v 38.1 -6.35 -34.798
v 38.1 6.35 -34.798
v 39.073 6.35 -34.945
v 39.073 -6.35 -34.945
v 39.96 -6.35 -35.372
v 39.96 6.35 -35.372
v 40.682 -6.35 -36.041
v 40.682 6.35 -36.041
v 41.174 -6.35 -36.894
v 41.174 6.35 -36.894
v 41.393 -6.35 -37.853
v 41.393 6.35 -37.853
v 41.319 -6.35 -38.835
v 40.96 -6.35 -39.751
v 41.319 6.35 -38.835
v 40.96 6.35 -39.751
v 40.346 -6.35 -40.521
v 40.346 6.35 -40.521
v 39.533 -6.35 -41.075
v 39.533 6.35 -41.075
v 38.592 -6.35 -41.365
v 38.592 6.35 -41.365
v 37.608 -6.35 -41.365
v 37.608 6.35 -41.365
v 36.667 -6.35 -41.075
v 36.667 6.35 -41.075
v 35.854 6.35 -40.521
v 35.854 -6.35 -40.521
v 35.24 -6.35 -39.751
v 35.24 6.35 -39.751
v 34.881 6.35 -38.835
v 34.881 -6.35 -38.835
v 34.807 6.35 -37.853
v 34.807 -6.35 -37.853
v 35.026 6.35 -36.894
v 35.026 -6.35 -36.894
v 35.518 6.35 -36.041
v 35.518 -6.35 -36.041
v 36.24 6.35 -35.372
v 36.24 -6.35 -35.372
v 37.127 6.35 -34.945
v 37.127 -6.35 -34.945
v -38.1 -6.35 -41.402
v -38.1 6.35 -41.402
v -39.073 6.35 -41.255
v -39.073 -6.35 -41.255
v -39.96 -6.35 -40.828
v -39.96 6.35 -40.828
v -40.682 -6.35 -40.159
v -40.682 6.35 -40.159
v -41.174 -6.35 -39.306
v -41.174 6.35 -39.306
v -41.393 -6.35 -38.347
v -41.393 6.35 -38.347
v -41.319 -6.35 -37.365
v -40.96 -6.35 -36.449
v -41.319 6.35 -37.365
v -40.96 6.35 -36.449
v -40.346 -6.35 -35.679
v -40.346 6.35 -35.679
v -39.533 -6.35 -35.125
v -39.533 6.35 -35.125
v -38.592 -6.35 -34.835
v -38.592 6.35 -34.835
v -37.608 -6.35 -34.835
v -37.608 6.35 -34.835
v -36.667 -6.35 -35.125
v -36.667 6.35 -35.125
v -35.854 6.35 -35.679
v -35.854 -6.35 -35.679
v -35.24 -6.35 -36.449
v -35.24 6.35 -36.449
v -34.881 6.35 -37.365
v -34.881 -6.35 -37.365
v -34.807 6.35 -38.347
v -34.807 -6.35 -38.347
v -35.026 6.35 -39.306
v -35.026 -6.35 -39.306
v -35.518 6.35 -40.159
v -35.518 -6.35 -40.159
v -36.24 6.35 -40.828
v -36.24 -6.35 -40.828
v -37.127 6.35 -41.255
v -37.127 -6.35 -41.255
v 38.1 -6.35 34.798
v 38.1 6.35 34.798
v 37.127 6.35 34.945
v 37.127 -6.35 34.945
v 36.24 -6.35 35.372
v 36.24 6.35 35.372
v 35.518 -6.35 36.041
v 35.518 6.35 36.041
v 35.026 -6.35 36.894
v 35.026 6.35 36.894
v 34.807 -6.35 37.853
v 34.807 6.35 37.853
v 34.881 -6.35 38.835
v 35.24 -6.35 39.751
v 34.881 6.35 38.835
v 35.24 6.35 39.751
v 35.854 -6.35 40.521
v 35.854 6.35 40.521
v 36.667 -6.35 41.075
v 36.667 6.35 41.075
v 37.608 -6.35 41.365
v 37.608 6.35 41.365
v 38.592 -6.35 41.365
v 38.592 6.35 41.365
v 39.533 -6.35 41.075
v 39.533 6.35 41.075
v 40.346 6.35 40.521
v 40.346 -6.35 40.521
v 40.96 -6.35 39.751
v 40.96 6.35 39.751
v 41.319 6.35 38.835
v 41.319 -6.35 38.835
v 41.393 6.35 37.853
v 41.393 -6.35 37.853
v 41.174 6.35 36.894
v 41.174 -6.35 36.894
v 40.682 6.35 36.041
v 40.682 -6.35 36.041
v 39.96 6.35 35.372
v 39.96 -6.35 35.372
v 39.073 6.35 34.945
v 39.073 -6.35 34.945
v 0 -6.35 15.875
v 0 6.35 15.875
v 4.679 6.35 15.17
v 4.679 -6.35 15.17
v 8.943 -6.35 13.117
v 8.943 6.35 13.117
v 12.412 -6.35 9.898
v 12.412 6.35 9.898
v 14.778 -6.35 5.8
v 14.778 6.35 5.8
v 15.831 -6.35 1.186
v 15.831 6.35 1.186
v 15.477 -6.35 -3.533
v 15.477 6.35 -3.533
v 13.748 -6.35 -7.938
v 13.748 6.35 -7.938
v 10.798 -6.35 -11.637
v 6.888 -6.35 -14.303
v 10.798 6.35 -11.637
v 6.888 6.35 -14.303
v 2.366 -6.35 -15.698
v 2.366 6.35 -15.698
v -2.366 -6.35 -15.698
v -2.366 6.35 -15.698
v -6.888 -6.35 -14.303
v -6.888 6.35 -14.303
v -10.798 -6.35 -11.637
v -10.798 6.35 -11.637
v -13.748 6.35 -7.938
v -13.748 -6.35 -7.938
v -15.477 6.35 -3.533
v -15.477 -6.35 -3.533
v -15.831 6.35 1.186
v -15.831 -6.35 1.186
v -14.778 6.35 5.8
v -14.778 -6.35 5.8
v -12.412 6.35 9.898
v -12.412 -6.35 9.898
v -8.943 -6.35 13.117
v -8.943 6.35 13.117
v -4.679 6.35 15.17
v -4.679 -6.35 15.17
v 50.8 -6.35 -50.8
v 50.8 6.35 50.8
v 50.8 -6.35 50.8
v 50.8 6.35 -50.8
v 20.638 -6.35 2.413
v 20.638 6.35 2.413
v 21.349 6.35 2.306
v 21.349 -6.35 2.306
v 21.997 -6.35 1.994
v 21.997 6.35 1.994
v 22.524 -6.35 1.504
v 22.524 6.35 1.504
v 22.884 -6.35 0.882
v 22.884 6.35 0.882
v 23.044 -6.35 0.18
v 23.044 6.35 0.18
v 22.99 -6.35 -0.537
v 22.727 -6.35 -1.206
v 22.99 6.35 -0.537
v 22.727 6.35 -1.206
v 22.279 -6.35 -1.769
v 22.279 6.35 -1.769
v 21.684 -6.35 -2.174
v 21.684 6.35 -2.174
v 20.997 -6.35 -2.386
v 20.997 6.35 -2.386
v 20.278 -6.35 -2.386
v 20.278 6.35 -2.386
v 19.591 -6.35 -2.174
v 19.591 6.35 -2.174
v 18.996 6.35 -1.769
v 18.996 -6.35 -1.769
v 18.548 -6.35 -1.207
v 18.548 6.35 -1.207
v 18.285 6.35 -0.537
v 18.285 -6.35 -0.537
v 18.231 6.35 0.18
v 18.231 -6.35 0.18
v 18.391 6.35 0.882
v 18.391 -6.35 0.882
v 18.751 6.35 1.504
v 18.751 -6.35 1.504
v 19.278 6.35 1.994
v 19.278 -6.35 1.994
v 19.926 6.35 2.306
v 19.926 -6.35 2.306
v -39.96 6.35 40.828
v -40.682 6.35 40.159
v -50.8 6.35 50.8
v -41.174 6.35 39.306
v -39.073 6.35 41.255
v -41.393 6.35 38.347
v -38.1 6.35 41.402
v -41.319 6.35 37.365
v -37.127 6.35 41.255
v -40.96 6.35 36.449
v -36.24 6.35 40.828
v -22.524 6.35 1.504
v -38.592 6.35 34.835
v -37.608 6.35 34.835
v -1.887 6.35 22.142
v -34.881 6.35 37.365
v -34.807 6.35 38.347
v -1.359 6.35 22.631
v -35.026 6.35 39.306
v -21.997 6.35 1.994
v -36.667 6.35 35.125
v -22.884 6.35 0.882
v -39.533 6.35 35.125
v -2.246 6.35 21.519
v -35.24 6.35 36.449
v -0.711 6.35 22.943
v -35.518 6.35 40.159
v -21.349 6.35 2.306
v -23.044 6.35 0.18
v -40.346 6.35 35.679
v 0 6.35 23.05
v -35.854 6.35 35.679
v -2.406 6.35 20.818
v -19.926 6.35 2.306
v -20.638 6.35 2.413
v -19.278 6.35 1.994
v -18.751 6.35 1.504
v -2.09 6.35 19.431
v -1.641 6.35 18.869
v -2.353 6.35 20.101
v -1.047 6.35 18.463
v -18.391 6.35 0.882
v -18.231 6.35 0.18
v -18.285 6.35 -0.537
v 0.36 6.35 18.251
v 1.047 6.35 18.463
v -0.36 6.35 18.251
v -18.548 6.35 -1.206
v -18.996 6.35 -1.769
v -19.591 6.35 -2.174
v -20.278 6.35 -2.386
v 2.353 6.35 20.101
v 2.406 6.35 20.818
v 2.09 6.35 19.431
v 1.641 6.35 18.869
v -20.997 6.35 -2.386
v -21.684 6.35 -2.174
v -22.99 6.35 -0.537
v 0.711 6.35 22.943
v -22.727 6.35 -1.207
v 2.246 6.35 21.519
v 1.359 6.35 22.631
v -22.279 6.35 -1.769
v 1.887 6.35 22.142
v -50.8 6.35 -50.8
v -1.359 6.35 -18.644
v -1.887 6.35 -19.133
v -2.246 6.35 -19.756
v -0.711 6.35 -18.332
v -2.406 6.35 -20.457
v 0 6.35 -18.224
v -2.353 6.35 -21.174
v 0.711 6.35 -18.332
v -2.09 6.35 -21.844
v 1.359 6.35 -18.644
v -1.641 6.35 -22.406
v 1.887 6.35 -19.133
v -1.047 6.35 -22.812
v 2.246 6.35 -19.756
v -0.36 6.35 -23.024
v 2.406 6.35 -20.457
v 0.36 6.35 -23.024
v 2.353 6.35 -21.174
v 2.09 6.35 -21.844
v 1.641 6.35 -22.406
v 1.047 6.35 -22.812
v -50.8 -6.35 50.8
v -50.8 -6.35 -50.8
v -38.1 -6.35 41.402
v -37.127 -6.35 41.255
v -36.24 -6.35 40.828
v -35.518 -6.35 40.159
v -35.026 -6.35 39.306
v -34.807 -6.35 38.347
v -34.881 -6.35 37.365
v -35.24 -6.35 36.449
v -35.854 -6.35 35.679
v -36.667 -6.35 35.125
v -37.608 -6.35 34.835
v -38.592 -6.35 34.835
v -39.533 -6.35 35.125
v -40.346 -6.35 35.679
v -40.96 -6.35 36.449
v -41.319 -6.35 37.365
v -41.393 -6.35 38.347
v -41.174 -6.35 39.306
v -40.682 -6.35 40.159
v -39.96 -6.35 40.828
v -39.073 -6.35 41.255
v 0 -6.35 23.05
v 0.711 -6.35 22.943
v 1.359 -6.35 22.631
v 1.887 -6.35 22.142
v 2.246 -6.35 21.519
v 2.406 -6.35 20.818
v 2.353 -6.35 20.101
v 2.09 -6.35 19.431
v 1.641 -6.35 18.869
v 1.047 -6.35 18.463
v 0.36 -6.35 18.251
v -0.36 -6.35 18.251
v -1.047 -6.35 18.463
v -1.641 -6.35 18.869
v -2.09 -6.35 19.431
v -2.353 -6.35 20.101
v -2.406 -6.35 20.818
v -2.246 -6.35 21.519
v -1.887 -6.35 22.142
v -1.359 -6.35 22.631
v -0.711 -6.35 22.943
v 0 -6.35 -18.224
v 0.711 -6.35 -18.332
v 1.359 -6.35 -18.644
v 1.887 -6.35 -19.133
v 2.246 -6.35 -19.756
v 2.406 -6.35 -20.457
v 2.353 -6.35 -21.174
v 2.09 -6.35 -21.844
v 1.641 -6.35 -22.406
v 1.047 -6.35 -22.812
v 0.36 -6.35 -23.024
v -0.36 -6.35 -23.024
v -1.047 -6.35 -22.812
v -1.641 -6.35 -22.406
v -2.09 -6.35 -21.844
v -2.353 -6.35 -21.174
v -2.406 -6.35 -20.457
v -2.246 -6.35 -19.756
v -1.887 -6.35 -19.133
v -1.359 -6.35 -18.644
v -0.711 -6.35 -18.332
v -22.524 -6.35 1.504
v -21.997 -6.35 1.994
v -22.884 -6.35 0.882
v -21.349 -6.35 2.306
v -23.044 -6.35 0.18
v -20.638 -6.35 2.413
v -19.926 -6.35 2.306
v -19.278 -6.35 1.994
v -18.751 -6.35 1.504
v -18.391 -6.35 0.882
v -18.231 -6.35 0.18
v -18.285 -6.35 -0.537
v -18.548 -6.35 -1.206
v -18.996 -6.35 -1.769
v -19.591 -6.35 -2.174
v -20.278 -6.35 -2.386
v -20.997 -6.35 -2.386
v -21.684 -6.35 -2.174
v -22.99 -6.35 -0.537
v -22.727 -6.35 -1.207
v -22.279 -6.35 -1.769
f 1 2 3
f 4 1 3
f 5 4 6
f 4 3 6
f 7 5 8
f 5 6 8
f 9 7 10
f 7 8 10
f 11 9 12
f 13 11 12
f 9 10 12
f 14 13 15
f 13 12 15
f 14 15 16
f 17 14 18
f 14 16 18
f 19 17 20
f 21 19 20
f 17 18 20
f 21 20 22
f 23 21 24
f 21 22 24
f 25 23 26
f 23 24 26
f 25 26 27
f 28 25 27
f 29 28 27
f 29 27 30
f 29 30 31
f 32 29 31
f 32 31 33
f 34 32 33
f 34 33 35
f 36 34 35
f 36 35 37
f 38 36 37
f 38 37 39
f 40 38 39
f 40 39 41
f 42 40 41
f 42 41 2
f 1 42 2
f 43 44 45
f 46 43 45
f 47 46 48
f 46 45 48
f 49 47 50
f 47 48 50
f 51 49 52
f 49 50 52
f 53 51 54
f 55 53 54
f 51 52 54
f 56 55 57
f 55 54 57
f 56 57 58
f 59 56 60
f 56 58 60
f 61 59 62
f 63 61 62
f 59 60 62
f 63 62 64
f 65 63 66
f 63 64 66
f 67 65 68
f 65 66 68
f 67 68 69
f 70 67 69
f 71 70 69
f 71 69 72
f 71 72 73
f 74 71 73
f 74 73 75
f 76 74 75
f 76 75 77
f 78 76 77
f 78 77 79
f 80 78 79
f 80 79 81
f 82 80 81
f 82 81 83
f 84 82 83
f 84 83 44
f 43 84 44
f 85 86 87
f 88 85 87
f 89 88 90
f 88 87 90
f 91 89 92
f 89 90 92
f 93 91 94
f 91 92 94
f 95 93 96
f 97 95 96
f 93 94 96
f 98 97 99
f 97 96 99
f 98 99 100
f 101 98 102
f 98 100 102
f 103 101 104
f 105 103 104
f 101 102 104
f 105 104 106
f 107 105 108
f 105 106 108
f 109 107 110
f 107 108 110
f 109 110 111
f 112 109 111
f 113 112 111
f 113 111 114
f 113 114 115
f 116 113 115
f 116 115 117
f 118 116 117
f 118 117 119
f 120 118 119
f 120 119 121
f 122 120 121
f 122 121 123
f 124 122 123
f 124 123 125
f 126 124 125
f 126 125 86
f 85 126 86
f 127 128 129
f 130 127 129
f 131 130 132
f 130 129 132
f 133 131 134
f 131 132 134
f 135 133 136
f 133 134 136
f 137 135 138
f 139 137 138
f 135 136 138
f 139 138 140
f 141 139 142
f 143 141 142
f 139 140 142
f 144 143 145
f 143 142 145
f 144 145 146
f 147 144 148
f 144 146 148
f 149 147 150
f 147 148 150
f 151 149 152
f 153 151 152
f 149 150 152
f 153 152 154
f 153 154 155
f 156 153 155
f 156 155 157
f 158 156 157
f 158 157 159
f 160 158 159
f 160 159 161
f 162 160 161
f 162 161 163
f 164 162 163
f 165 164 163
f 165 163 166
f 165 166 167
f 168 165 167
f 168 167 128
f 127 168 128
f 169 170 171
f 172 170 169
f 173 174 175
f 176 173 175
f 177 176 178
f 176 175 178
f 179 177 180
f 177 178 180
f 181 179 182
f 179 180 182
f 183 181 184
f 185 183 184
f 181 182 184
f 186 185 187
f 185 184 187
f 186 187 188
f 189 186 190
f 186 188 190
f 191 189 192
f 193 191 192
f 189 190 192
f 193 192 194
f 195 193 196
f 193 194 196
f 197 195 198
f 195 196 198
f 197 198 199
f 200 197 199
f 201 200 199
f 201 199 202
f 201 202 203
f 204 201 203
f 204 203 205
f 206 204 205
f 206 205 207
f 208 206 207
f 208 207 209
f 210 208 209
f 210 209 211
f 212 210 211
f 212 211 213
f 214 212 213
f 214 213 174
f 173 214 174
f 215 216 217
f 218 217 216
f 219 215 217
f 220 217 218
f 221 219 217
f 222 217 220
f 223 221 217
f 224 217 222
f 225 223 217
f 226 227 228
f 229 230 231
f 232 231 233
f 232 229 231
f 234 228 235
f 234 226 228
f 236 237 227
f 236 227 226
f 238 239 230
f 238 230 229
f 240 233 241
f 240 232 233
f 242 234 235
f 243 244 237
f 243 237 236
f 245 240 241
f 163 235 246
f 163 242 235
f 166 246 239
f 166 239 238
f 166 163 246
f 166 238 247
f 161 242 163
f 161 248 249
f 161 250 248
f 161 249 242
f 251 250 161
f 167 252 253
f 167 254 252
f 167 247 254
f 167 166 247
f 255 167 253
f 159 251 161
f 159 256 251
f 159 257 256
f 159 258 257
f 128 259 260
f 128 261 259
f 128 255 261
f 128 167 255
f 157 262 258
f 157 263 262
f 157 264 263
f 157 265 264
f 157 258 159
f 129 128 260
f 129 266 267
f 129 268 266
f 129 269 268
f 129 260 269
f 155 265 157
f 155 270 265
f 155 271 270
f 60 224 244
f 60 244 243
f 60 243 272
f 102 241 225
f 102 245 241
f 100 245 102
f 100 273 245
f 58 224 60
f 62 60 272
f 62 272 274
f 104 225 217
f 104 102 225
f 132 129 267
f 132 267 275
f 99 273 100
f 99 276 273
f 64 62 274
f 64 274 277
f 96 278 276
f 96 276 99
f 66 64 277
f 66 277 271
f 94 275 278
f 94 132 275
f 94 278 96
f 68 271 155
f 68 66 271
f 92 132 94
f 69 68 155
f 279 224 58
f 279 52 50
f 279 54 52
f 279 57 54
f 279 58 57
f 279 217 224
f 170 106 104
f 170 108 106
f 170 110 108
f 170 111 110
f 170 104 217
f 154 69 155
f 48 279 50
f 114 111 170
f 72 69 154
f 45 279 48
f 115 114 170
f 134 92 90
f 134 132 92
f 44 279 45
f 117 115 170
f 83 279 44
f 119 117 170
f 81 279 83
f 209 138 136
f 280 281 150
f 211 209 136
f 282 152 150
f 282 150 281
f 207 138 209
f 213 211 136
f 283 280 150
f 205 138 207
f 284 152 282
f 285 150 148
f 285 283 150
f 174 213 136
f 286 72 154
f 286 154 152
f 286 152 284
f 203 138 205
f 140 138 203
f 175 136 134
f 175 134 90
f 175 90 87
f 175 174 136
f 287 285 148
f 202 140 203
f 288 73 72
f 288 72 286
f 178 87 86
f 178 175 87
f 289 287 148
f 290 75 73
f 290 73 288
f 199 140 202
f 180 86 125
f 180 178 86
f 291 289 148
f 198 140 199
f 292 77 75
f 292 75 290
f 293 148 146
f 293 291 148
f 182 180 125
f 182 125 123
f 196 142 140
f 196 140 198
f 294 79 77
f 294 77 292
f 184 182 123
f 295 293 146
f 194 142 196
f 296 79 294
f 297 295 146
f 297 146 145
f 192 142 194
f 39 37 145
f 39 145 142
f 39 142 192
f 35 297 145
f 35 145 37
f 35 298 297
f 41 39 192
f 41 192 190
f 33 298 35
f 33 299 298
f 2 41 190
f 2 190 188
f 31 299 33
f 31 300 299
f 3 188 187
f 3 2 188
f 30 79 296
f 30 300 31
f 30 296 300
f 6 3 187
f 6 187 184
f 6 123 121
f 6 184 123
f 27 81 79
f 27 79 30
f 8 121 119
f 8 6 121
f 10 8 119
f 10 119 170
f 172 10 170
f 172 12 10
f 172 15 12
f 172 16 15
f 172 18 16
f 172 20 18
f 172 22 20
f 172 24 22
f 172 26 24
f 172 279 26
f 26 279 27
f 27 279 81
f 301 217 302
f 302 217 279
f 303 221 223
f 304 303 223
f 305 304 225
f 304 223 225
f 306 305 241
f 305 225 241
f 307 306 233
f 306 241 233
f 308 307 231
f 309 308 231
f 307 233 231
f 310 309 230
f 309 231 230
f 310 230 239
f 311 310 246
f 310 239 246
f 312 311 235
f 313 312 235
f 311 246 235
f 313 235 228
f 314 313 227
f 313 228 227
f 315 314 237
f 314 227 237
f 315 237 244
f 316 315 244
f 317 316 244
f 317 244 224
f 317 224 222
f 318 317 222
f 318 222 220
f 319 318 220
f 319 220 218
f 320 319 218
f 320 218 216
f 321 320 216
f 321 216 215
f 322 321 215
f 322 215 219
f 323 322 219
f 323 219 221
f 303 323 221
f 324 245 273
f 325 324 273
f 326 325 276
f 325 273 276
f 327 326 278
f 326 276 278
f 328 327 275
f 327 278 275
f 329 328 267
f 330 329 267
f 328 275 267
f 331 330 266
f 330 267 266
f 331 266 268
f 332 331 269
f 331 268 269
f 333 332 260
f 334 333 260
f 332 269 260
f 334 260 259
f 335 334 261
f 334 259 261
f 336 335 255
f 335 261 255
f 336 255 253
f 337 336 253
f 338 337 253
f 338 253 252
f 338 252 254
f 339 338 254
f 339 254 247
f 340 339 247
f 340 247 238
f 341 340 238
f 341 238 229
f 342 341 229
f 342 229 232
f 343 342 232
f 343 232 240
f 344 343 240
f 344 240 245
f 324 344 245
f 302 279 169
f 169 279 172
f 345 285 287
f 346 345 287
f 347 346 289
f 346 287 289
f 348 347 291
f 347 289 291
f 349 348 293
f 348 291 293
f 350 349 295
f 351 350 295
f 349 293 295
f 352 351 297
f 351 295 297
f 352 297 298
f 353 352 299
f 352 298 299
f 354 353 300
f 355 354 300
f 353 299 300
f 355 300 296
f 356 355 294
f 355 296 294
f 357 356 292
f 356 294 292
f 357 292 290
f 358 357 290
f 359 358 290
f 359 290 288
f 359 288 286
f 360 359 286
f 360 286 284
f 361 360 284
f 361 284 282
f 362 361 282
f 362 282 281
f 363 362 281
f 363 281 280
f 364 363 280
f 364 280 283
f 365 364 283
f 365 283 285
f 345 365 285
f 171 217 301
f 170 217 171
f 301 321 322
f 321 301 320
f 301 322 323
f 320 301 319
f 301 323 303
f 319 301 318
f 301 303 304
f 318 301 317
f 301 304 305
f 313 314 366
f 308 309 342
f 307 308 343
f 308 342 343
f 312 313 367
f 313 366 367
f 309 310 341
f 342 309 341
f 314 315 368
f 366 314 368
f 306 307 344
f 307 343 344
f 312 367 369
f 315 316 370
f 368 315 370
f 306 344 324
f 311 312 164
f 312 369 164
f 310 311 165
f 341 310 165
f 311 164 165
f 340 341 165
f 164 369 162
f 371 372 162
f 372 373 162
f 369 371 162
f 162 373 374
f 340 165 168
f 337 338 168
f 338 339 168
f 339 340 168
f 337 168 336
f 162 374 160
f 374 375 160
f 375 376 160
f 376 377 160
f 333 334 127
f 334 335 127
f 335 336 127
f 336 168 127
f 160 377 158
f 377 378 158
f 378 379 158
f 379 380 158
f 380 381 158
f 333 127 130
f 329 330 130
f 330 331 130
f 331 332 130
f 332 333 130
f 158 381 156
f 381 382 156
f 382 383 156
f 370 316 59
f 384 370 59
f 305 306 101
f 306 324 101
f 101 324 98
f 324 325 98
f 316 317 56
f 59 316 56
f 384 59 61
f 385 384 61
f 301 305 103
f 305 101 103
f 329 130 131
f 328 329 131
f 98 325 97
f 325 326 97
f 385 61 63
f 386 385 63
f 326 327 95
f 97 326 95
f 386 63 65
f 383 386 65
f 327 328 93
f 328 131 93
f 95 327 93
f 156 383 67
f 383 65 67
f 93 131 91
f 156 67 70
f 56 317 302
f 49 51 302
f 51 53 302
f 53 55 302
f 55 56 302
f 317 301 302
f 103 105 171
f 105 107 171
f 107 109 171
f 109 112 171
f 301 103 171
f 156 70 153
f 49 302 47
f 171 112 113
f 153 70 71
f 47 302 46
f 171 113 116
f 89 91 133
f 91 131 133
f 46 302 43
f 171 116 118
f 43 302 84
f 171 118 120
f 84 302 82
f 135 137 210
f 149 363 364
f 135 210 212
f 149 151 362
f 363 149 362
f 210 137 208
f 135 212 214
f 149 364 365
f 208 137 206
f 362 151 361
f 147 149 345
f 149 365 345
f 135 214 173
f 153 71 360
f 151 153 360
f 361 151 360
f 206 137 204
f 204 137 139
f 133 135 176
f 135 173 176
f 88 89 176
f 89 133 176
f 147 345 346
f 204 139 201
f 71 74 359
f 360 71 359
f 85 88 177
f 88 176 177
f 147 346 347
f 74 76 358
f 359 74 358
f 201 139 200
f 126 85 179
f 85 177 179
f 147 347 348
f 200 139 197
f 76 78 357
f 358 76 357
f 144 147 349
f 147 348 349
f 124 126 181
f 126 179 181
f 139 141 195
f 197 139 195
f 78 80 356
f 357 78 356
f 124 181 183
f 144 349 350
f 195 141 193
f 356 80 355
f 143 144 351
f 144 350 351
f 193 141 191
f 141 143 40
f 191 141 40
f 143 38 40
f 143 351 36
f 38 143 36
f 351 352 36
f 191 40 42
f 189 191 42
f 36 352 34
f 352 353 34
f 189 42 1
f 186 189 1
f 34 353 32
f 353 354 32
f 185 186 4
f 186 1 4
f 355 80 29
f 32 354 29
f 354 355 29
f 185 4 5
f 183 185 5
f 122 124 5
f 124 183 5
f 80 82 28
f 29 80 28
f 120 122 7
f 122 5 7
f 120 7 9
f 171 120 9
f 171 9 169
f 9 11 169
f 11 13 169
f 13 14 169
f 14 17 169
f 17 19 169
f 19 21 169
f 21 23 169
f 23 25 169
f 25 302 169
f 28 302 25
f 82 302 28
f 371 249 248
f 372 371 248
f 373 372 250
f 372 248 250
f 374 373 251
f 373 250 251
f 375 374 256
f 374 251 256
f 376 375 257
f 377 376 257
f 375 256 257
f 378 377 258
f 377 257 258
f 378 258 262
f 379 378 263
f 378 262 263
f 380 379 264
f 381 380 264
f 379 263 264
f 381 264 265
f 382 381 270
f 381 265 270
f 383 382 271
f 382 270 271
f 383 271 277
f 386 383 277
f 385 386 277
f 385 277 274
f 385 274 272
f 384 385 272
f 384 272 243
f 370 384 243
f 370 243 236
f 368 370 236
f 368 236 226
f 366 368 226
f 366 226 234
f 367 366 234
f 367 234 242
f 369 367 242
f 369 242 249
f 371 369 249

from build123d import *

# Parameters (mm, degrees)
SKETCH2_W           = 101.6
SKETCH2_H           = 101.6
BOSS_EXTRUDE1_DEPTH = 6.35
SKETCH3_R           = 3.302
CUT_EXTRUDE1_DEPTH  = 73.955945611
SKETCH4_R           = 15.875
SKETCH4_R_2         = 2.413
CUT_EXTRUDE2_DEPTH  = 73.955945611


with BuildPart() as part:
    # Sketch2 → Boss-Extrude1 (new, symmetric)
    with BuildSketch(Plane(origin=(0, 0, 0), x_dir=(1, 0, 0), z_dir=(0, 1, 0))):
        Rectangle(SKETCH2_W, SKETCH2_H)
    extrude(amount=BOSS_EXTRUDE1_DEPTH, both=True)

    # Sketch3 → Cut-Extrude1 (cut, through all)
    with BuildSketch(Plane(origin=(0, 6.35, 0), x_dir=(1, 0, 0), z_dir=(0, 1, 0))):
        with Locations(Location((-38.1, -38.1, 0), (0, 0, 270))):
            Circle(SKETCH3_R)
        with Locations(Location((-38.1, 38.1, 0), (0, 0, 90))):
            Circle(SKETCH3_R)
        with Locations(Location((38.1, -38.1, 0), (0, 0, 90))):
            Circle(SKETCH3_R)
        with Locations(Location((38.1, 38.1, 0), (0, 0, 270))):
            Circle(SKETCH3_R)
    extrude(amount=-CUT_EXTRUDE1_DEPTH, mode=Mode.SUBTRACT)

    # Sketch4 → Cut-Extrude2 (cut, through all)
    with BuildSketch(Plane(origin=(0, 6.35, 0), x_dir=(1, 0, 0), z_dir=(0, 1, 0))):
        with Locations(Location((0, 0, 0), (0, 0, 270))):
            Circle(SKETCH4_R)
        with Locations(Location((0, 20.6375, 0), (0, 0, 270))):
            Circle(SKETCH4_R_2)
        with Locations(Location((20.6375, 0, 0), (0, 0, 270))):
            Circle(SKETCH4_R_2)
        with Locations(Location((0, -20.6375, 0), (0, 0, 270))):
            Circle(SKETCH4_R_2)
        with Locations(Location((-20.6375, 0, 0), (0, 0, 270))):
            Circle(SKETCH4_R_2)
    extrude(amount=-CUT_EXTRUDE2_DEPTH, mode=Mode.SUBTRACT)


solid = part.part
